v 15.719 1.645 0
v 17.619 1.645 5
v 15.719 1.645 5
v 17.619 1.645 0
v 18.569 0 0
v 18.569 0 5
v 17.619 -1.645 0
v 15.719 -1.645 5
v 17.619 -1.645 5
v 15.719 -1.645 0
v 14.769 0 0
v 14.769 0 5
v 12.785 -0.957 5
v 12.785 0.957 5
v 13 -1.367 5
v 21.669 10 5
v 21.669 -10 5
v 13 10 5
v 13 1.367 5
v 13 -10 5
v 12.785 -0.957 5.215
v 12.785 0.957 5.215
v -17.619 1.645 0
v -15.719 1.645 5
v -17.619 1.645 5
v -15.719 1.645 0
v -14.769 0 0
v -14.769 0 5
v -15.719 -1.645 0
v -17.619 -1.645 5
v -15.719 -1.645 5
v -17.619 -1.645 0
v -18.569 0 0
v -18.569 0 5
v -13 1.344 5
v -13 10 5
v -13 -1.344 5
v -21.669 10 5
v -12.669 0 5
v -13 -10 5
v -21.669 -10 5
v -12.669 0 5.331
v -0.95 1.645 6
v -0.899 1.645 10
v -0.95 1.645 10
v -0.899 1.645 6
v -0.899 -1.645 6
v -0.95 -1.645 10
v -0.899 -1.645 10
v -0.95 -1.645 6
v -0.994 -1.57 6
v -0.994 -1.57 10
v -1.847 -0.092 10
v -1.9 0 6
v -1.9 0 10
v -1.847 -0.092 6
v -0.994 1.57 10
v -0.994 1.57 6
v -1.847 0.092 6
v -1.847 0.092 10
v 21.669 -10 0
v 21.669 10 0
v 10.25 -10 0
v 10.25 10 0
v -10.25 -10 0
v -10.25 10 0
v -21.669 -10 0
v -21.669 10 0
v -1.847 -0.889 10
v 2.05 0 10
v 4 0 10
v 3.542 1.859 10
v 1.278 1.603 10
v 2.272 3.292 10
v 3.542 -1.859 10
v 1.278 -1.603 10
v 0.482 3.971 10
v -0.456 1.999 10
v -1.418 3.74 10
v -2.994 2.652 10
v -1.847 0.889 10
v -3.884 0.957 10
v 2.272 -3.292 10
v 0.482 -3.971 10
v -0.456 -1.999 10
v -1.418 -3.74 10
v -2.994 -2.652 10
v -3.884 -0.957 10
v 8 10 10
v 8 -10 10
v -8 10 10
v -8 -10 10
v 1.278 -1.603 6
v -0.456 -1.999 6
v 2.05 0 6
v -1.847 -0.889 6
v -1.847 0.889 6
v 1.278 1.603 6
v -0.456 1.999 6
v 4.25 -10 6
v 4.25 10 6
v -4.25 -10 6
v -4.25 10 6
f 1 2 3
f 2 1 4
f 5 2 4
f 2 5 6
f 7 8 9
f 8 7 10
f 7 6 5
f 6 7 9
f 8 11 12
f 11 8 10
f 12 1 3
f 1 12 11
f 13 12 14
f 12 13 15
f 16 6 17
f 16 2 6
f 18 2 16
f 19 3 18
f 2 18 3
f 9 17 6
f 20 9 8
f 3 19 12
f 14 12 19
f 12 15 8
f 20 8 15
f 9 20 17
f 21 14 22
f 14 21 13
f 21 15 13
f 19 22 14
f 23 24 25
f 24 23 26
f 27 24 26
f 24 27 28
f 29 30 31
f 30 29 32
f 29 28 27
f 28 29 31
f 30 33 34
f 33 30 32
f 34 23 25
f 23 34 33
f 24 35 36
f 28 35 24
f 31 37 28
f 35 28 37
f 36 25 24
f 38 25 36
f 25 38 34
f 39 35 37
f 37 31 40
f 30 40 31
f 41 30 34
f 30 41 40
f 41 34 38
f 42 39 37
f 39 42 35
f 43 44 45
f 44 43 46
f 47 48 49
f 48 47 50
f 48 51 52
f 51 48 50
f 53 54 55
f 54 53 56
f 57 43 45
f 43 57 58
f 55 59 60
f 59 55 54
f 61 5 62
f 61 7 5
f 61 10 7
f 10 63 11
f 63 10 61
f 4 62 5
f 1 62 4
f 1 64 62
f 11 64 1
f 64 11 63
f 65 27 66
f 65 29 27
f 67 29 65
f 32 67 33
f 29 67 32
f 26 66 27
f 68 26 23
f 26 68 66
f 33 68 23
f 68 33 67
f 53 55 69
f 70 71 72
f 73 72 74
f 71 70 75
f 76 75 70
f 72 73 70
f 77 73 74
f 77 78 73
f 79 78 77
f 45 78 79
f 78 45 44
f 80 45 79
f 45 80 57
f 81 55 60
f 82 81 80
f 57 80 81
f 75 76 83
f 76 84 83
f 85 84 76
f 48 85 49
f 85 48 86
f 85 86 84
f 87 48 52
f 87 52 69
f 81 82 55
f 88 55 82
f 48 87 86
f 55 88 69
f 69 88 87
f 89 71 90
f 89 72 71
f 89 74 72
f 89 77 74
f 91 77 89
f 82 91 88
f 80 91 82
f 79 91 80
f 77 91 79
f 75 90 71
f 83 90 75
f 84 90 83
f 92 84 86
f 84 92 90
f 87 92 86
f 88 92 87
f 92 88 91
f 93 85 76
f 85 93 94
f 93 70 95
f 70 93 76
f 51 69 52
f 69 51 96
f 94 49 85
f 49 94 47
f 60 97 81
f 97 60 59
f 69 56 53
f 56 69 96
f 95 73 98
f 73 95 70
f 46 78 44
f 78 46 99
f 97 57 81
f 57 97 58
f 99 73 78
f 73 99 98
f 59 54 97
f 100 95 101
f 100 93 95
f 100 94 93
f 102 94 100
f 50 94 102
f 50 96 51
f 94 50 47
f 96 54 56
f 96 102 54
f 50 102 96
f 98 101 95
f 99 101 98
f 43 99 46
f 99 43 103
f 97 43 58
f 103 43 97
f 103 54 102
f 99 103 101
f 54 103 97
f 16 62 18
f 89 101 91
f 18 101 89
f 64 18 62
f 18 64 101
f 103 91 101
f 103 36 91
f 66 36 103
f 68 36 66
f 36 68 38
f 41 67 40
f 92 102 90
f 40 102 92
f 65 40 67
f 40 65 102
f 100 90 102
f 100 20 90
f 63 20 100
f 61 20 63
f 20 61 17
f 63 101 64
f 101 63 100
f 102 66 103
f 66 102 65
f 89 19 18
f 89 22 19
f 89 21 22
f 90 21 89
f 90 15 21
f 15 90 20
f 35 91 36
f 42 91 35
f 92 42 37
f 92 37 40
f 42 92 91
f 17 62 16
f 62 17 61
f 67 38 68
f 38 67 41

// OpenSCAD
// file: common_parts.scad
include <tunable_constants.scad>;
//common_flat_screw_tap();
module M3_flat_screw(l = 10, l2 = 0) {
    // l2 is amount of the screw that are bigger for sliding through the hole
    tap_z = 1.9;
    rotate([180,0,0])
    union() {
        cylinder(d = C_M3_DIAMETER_THREAD, h= l);
        cylinder(d = C_M3_DIAMETER, h= l2);
        translate([0,0,-0.1+0.1]) cylinder(d1 = 6.5, d2= C_M3_DIAMETER_THREAD, h= tap_z);
        translate([0,0,-0.1]) cylinder(d = 6.5, h= 0.3);
    }
}

module M4_button_screw(l = 10, l2 = 0) {
    rotate([180,0,0])
    union() {
        cylinder(d = C_M4_DIAMETER_THREAD, h= l);
        cylinder(d = C_M4_DIAMETER, h= l2);
        translate([0,0,-4]) cylinder(d = 8, h=4);
    }
}
module M3_button_screw(l = 10, l2 = 0) {
    rotate([180,0,0])
    union() {
        cylinder(d = C_M3_DIAMETER_THREAD, h= l);
        cylinder(d = C_M3_DIAMETER, h= l2);
        translate([0,0,-4]) cylinder(d =6, h=4);
    }
}

module roundedcube(xdim ,ydim ,zdim,rdim){
    hull(){
        fn=30;
        translate([rdim,rdim,0]) cylinder(r=rdim, h=zdim, $fn=fn);
        translate([xdim-rdim,rdim,0])cylinder(r=rdim, h=zdim, $fn=fn);

        translate([rdim,ydim-rdim,0]) cylinder(r=rdim, h=zdim, $fn=fn);
        translate([xdim-rdim,ydim-rdim,0]) cylinder(r=rdim, h=zdim, $fn=fn);
    }
}
//beam45();
module beam45(w = 10, l = 10, h = 8) {
    difference() {
        union() {
            translate([-w/2,0,0]) cube([w,l,h]);
        }
        translate([w/2,0,0]) rotate([0,45,0])translate([-w-h,-1,0]) cube([w+h*2,l+2,h*2]);
        translate([-w/2,0,0]) rotate([0,-45,0])translate([0-w,-1,0]) cube([w+h*2,l+2,h*2]);
    }
}
//beam30();
module beam30(w = 10, l = 10, h = 8) {
    difference() {
        union() {
            translate([-w/2,0,0]) cube([w,l,h]);
        }
        translate([w/2,0,0]) rotate([0,90-30,0])translate([-w-h,-1,0]) cube([w+h*2,l+2,h*2]);
        translate([-w/2,0,0]) rotate([0,-90+30,0])translate([0-w,-1,0]) cube([w+h*2,l+2,h*2]);
    }
}


module cylinder_outer(height,radius,fn){
   fudge = 1/cos(180/fn);
   cylinder(h=height,r=radius*fudge,$fn=fn);
}

//indicator_dots(2);

module indicator_dots(valueIn) {
    for (a =[0:1:valueIn-1]) {
        translate([a*3,0,0]) cube([2,2,1]);
    }
}
// file: tunable_constants.scad
// Change parameters to fit your printer and slicer differences

C_M3_DIAMETER = 3.3; // size of a hole that a M3 screw will slide through
C_M3_DIAMETER_THREAD = 2.8; // size of a hole that a M3 screw will create own threads in

C_M3_NUT = 7;

C_KINGPIN_LOOSE = 3.5; // The hole for kingpin in the arms that are suposed to slide
C_KINGPIN_SNUG = 3.3; // The hole in the steering hub where the kingpin is suposed to be tightly locked with a screw

C_M4_NUT = 8.4;

C_M4_DIAMETER = 4.1; // size of a hole that a M4 screw will slide through
C_M4_DIAMETER_THREAD = 3.8; // size of a hole that a M4 screw will create own threads in

    b_12mm_tol = 0.3; // tolerance for bearing with 12mm diameter

C_12MM_BEARING_D = 12+b_12mm_tol; // Size of a hole that hold a 12mm bearing
C_12MM_BEARING_H = 3.5;

C_8MM_LOOSE = 8.7; // Loose fitting that will guarantie that it will not touch
C_8MM_TIGHT = 8.2; // Tight fitting for indrive etc
C_8MM_FIT = 8.5; // Perfect fit for it to be removable but not by much force, used for left wheel mount

C_SIGHT_MOUNT_S = 33.3375;

C_MOUNT1_W = 28;
// ############# Settings ################
S_CASTER = 4;
S_CAMBER = 2;

S_BAR_W = 20;
S_BAR_H = 5;
// main file
//
include <tunable_constants.scad>;
use <common_parts.scad>

w = C_SIGHT_MOUNT_S + 10;
h = S_BAR_H+5;
l = 20;

bow_mount_p();
module bow_mount_p() {
    
    
    difference() {
        union() {
            translate([-w/2,-l/2,0]) cube([w,l,h]);
        }
        screws();
        translate([0,-l/2,0]) beam45(w=S_BAR_W+0.5, l=l, h=S_BAR_H+1);
        translate([28,-l/2,15]) rotate([0,180,0]) beam45(w=50, l=l, h=10);
        translate([-28,-l/2,15]) rotate([0,180,0]) beam45(w=50, l=l, h=10);
    }

}

%screws();
module screws() {
    translate([C_SIGHT_MOUNT_S/2,0,5]) M4_button_screw();
    translate([-C_SIGHT_MOUNT_S/2,0,5]) M4_button_screw();
    
    translate([0,0,h]) M4_button_screw(l2=20);
}
